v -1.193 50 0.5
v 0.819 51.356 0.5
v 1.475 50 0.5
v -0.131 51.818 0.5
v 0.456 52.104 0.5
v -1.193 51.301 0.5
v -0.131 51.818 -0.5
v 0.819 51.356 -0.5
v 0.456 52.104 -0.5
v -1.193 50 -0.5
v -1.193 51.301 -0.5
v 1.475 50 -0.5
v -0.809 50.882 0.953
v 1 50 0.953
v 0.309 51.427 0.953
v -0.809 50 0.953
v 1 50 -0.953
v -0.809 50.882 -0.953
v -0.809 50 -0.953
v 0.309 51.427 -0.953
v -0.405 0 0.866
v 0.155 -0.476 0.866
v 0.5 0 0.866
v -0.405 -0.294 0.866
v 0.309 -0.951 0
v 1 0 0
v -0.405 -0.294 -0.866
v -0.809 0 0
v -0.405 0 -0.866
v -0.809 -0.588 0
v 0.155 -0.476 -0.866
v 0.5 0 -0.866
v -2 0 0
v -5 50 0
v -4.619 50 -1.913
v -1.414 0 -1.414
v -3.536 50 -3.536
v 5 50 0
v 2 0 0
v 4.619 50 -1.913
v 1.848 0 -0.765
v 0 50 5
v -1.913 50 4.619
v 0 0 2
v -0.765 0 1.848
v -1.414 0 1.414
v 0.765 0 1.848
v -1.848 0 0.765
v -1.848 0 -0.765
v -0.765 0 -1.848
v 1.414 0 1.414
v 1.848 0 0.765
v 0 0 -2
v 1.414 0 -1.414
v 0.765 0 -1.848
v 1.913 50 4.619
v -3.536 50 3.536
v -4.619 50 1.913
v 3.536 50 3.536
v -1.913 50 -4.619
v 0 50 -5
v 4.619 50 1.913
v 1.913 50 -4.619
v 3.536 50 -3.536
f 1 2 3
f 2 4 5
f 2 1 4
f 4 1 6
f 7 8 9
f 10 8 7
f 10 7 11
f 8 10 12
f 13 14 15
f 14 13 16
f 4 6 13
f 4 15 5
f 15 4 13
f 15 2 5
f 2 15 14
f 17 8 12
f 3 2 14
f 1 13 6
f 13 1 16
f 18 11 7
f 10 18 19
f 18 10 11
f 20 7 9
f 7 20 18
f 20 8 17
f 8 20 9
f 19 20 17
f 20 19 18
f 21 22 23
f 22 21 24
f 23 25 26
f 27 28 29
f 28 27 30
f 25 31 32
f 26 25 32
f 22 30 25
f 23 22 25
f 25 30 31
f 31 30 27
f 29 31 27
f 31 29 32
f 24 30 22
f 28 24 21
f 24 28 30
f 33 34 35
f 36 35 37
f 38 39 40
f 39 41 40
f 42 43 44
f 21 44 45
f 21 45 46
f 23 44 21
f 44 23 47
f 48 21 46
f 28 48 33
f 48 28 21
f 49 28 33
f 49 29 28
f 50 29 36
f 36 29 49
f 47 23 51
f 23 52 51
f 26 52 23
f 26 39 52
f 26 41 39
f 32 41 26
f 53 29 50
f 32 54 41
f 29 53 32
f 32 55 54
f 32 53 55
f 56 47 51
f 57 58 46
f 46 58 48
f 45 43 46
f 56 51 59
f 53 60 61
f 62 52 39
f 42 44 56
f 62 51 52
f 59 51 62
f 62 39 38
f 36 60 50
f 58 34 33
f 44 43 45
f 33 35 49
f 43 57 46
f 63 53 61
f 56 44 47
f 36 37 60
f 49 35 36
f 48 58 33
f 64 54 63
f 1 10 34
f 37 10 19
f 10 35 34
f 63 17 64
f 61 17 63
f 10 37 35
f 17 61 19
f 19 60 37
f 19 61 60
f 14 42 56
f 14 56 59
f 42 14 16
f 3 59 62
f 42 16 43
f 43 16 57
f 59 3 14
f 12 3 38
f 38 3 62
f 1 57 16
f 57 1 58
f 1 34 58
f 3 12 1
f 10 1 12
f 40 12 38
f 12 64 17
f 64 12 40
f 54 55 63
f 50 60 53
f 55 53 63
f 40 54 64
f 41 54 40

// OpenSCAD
// file: mother_ship.scad
module ms_corner_bar(h, r, n) {
    translate([0,0,(h /2)])
		rotate([90,0,((360/n) /2)])
			cylinder(r, r/100, r/100, $fn = 4);
}


module ms_disk_subtract(h,r,n, core=false) {
    translate([0,0,-(r/2)]) union() {
        mirror([1,0,0])
            rotate([0,0,-((360/n)/2)])
                cube(2*r);

        rotate([0,0,-((360/n)/2)])
            cube(2*r);
        
        if (!core) {
            cylinder(h*4,r/4,r/4);
        }

        translate([-2*r,-2*r, 0])
            cube([r*4,r*2,r*2]);
    }
    
    if (!core) {
        rotate([0,0,180]) {
            ms_corner_bar(h,r,n); 
            mirror([1,0,0]) ms_corner_bar(h,r,n);
            mirror([0,0,1]) ms_corner_bar(h,r,n);
            mirror([0,0,1]) mirror([1,0,0]) ms_corner_bar(h,r,n);
        }
    }
    if (core) {
        translate([0,0,-h*1.25])
            cylinder(h,2*r+1,0);
        
        translate([0,0,-3.15*h])
            cylinder(2*h,2*r+1,2*r+1);
        
    }
    
}

module ms_disk_hangar(h,r,n) {
    difference() {
        translate([0,0,-(h/2)])
            cylinder(h,r,r*.85);

        ms_disk_subtract(h,r,n);
    }
}

module ms_disk_hangar_scale(h,r,n) {
    scale([1.02,1,1]) ms_disk_hangar(h,r,n);
}

module ms_disk_core(h,r,n) {
    difference() {
        translate([0,0,-1.5*h])
            cylinder(2*h, 1.8*r, 0.85*r);
        
        ms_disk_subtract(h,r,n, core=true);
    }
}

module ms_disk(h,r,n) {
    disk_segment_angle = 360/n;
    for(angle=[disk_segment_angle:disk_segment_angle:360-disk_segment_angle])
        rotate(angle)
            ms_disk_hangar_scale(h,r,n);
}


module ms_main(h,r,n) {
    ms_disk(h,r,n);
    ms_ball(h,r,n);
    ms_engg(h,r,n);
}

module ms_ball(h,r,n) {
    sphere_radius = min(1.5*h, r/5);
    sphere(sphere_radius);
}

module ms_engg(h,r,n) {
    ms_disk_core(h,r,n);
    ms_pylon(h,r,n);
    ms_nac_assembly(h,r,n);
    mirror([1,0,0]) ms_nac_assembly(h,r,n);
}


module ms_nac_assembly(h,r,n) {
    translate([r*.8,r*1.25,h*.6])
        ms_nacelle(h,r,n);
}

module ms_nacelle(h,r,n) {
    scale([.4,1,.8])
        difference() {
            union () {
                rotate([-90,0,0])
                    cylinder(2*r,h,h*.6, $fn=6);

                sphere(h*1.05, $fn=6);
            }

            translate([-2*r,-2*r,-4*r])
                cube(r*4);

            translate([-r/2,r*1.6,-h/2])
                rotate([-45,0,0])
                    cube (r);
    }
}

module mothership() {
    ms_main(100,400,16);
}

mothership();

module ms_pylon(h, r, n) {
    rad1 = h/2 + r*r/(8*h);

    translate([0,r*1.5,.25*h]) rotate([-10,0,0]) scale([1.6,1,1.8]) difference() {
        translate([0,0,rad1-.8*h])
            rotate([90,0,0])
                cylinder(2*h, rad1, rad1, $fn=10);

        translate([0,h/10,rad1-.75*h])
            rotate([90,0,0])
                cylinder(2.2*h, rad1, rad1, $fn=10);
            
        translate([-r,-2.75*r,-2*h])
            rotate([-27,0,0])
                cube(2*r);

        translate([-r,-r,h*.3])
            cube(2*r);
    }
}
// main file
use <mother_ship.scad>;

ms_disk();

ms_ball();

translate([0,45,0])
ms_ball();

rotate([-90,0,0])
cylinder(50,2,5, $fn=16);


difference() {
translate([0,50,0])
scale([2,3,1.1])
ms_ball();

ms_engine_minus();
}

module ms_engine_minus() {
    cube(90,center=true);
    
    translate([0,45,0])
        cube([100,100,1], center=true);
}
